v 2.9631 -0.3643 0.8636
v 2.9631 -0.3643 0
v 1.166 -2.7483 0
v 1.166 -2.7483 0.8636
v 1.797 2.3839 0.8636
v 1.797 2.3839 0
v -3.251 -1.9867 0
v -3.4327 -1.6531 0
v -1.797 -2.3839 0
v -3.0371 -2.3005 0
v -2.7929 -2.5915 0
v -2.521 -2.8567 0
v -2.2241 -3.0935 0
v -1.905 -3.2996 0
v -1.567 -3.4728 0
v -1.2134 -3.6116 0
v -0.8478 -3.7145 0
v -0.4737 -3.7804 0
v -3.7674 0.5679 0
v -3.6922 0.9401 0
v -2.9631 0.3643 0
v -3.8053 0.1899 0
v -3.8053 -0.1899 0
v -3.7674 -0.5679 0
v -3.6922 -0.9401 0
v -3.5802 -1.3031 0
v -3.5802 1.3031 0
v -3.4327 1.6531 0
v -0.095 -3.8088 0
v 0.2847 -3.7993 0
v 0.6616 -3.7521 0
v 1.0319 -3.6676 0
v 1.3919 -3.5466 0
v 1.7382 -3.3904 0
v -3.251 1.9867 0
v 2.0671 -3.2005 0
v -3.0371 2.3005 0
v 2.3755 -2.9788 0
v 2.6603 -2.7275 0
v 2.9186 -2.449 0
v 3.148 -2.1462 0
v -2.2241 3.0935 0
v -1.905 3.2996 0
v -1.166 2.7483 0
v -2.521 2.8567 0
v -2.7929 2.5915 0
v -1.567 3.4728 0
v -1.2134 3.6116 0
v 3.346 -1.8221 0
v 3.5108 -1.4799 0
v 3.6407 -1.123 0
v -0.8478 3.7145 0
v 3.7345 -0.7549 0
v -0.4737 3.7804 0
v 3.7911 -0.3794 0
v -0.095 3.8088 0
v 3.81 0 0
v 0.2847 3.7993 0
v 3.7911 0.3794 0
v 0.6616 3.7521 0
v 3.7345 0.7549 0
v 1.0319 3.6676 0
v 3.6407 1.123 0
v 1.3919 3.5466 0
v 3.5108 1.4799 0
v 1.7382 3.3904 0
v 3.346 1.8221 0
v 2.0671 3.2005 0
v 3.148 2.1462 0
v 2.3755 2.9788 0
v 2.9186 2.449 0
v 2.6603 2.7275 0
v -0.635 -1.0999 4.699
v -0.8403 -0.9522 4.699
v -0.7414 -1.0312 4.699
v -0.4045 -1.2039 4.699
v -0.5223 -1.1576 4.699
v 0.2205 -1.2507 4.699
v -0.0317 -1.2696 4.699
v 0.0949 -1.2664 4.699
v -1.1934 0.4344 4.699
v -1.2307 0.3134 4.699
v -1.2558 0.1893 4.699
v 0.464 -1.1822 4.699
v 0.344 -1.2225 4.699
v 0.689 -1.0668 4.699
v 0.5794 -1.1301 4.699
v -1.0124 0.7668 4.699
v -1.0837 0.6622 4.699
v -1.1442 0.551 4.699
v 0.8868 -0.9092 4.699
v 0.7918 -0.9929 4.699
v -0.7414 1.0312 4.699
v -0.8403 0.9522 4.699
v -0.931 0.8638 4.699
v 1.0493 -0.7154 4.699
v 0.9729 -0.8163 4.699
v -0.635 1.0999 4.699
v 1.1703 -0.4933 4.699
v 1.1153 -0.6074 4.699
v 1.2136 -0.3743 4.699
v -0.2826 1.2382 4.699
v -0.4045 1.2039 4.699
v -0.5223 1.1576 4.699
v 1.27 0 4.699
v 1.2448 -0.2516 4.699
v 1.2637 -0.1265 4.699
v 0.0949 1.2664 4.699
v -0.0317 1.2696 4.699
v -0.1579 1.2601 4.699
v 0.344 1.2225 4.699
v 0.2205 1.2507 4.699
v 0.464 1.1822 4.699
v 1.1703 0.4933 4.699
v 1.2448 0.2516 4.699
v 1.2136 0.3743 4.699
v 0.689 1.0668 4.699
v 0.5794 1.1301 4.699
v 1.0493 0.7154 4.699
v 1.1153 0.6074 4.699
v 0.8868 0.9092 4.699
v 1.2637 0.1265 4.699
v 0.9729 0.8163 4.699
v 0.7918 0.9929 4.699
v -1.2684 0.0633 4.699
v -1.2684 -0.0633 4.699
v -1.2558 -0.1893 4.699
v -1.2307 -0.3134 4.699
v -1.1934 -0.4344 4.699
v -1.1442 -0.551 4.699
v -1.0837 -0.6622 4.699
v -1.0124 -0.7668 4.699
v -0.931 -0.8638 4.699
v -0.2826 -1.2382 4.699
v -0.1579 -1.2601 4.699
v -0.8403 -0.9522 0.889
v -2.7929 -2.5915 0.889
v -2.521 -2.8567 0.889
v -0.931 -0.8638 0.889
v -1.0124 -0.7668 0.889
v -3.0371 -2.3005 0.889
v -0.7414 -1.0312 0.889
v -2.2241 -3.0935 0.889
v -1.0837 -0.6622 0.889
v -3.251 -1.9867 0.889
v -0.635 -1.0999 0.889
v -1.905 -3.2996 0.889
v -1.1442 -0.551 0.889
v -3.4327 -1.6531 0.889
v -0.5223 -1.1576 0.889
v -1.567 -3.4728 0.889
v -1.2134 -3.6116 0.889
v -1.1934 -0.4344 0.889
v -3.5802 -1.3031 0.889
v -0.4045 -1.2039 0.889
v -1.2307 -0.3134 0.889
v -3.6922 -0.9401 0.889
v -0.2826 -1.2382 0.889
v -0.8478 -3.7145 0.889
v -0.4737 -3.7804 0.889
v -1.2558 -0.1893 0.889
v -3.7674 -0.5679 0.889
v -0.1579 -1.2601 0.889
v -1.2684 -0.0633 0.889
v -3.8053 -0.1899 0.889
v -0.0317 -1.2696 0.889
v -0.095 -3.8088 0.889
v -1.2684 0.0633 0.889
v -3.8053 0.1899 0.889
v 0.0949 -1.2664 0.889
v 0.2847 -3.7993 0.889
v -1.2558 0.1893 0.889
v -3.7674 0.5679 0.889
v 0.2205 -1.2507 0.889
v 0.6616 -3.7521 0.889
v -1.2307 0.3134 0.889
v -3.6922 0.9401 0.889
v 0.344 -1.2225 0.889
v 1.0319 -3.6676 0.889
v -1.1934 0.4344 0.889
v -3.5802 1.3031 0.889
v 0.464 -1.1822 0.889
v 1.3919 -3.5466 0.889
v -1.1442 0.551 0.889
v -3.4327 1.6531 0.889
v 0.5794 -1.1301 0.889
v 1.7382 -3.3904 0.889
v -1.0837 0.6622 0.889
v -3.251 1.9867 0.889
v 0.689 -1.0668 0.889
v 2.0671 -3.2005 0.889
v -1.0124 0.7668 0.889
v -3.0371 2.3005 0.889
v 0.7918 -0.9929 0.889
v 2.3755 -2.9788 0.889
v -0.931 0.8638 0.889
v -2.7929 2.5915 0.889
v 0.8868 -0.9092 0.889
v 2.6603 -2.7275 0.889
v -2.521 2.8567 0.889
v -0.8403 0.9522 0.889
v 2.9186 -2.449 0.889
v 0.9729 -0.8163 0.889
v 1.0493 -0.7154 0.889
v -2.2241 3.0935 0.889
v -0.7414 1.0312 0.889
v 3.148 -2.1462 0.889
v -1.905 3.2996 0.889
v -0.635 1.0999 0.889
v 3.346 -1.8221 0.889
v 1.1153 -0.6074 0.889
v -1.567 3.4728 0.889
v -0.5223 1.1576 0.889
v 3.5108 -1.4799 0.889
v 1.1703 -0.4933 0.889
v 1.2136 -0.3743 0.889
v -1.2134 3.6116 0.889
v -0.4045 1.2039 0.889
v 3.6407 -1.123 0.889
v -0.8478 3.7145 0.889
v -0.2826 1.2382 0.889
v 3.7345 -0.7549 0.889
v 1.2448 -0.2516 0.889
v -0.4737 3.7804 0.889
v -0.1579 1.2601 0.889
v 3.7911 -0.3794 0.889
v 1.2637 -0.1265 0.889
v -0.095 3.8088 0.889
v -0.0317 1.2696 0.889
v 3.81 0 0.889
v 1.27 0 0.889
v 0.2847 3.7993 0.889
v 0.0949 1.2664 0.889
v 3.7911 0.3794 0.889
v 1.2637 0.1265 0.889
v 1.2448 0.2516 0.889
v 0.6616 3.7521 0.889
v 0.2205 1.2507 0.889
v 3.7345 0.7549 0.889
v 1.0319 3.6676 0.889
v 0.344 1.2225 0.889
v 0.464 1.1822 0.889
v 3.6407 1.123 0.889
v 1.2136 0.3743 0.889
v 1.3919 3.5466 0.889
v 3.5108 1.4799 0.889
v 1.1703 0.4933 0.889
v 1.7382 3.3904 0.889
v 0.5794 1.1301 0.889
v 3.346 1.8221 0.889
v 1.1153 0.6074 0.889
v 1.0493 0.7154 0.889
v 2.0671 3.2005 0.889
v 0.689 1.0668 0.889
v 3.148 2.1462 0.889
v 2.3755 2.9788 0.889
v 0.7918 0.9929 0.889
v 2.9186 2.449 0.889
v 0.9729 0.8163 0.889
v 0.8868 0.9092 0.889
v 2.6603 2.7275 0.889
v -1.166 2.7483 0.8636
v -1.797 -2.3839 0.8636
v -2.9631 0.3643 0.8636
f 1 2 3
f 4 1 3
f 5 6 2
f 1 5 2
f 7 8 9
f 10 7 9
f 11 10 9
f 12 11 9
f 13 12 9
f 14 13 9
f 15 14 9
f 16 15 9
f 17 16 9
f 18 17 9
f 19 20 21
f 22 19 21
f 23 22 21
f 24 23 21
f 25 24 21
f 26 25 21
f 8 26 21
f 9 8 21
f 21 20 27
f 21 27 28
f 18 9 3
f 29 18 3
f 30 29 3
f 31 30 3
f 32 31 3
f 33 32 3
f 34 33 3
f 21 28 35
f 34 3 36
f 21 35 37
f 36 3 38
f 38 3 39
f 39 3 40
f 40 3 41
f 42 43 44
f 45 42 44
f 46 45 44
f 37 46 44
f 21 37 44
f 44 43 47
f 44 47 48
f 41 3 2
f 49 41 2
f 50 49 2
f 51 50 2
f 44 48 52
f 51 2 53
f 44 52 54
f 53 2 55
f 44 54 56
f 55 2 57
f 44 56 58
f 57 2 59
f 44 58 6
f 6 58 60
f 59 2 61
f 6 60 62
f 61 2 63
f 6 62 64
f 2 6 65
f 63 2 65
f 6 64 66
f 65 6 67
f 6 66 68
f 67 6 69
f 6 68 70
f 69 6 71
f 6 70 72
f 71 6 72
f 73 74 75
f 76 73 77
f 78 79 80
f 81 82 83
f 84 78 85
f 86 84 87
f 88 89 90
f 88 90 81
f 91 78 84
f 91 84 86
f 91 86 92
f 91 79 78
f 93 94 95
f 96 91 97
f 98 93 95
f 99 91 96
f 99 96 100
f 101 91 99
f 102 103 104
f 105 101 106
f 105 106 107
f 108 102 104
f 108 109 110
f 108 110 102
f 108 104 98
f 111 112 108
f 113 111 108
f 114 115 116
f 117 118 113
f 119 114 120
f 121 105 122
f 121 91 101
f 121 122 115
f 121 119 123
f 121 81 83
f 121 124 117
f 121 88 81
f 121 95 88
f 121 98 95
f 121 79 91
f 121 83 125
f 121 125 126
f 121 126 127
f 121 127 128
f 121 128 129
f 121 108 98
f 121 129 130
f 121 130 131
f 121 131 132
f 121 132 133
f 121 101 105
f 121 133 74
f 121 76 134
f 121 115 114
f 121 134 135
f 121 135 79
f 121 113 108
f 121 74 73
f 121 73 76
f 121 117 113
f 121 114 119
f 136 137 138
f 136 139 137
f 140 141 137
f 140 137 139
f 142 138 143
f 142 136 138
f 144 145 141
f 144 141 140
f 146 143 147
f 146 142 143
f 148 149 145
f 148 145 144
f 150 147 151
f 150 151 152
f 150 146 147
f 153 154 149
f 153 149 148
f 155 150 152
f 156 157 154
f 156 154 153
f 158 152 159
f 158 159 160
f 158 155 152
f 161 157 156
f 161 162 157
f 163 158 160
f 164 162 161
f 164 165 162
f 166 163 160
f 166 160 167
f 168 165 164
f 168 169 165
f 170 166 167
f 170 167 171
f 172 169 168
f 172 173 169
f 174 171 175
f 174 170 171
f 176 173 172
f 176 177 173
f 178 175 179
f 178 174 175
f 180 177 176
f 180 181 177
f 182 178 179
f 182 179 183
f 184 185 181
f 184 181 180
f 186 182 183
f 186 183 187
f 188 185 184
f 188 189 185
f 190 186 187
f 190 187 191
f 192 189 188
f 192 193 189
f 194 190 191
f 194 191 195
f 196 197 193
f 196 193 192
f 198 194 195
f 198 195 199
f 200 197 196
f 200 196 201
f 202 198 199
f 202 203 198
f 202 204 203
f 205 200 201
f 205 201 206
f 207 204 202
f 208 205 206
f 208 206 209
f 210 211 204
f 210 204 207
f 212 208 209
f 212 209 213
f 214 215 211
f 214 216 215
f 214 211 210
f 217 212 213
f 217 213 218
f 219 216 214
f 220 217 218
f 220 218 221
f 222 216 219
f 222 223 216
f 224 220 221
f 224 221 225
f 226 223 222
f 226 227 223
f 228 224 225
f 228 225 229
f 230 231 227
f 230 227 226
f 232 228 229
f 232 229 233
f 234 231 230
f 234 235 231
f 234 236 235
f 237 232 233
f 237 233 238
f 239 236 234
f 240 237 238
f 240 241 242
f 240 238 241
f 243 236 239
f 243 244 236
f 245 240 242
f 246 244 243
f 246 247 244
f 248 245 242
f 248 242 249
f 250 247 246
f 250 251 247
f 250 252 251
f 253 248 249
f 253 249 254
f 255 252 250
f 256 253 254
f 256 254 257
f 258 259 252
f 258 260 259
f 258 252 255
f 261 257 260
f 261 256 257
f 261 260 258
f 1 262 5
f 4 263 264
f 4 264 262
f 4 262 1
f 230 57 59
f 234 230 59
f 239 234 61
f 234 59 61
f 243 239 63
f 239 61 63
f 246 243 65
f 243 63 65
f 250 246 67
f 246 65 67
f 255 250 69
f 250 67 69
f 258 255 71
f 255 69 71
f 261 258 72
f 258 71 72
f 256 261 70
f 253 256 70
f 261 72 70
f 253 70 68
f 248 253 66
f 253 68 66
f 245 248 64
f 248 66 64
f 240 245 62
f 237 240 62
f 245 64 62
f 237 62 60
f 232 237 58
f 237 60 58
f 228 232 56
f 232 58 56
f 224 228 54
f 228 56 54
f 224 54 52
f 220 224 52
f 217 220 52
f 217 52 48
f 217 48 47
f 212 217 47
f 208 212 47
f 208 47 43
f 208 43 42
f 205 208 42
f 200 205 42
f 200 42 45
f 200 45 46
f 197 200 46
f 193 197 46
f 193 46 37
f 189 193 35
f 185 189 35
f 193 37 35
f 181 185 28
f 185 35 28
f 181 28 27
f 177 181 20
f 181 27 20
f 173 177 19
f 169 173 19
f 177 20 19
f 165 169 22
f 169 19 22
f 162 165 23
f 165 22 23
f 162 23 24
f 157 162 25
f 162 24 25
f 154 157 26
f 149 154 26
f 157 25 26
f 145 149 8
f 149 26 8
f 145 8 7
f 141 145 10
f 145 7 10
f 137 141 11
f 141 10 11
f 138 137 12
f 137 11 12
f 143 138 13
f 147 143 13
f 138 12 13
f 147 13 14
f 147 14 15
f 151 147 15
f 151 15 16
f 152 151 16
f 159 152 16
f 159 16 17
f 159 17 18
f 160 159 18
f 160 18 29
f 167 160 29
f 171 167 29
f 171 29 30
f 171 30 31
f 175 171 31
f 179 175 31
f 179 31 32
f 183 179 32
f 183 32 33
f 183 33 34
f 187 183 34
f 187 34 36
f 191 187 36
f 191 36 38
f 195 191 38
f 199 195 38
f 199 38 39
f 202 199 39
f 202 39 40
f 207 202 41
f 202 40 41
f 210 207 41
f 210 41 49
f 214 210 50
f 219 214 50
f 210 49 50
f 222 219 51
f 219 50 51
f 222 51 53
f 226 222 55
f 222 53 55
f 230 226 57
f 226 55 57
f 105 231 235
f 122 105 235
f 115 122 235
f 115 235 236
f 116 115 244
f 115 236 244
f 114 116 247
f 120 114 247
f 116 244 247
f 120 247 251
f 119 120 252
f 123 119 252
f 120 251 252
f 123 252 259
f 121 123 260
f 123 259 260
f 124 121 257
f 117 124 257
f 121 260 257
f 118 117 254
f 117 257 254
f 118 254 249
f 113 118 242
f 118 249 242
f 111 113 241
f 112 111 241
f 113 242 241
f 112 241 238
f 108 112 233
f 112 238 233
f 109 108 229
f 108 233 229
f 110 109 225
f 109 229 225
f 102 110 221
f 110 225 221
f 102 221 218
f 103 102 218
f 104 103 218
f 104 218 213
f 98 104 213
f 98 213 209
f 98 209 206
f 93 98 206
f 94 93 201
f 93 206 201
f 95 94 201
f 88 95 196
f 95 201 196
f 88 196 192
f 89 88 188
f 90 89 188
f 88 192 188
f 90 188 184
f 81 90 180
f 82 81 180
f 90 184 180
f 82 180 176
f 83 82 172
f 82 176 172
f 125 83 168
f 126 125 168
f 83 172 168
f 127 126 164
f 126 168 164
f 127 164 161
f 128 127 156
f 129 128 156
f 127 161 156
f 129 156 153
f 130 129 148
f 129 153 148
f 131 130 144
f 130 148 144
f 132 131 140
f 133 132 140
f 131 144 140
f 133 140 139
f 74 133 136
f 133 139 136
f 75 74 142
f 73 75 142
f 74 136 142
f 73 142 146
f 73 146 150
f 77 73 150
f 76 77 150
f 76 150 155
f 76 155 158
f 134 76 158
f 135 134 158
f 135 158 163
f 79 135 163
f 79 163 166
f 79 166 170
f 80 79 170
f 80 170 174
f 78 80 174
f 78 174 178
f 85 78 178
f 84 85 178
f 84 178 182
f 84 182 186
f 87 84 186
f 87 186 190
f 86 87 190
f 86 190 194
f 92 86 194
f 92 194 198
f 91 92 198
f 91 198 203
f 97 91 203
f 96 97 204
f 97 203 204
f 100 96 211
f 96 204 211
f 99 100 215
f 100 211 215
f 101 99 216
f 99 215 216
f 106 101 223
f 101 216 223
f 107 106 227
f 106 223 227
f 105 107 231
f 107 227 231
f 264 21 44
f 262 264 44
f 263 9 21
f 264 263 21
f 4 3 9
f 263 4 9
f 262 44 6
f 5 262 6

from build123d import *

# Parameters (mm, degrees)
F0_R     = 3.81
F1_DEPTH = 0.889
F2_R     = 1.27
F3_DEPTH = 3.81
F5_DEPTH = 0.8636


with BuildPart() as f1:
    # F0 (on Top) → F1 (new body)
    with BuildSketch(Plane.XY):
        Circle(F0_R)
    extrude(amount=F1_DEPTH)

    # F2 (on face) → F3 (join)
    with BuildSketch(Plane.XY.offset(0.889)):
        Circle(F2_R)
    extrude(amount=F3_DEPTH)

    # F4 (on face) → F5 (cut)
    with BuildSketch(Plane(origin=(0, 0, 0), x_dir=(1, 0, 0), z_dir=(0, 0, -1))):
        Polygon((2.963077, 0.36432), (1.166028, 2.74826), (-1.797049, 2.38394), (-2.963077, -0.36432), (-1.166028, -2.74826), (1.797049, -2.38394), align=None)
    extrude(amount=-F5_DEPTH, mode=Mode.SUBTRACT)


solid = f1.part
